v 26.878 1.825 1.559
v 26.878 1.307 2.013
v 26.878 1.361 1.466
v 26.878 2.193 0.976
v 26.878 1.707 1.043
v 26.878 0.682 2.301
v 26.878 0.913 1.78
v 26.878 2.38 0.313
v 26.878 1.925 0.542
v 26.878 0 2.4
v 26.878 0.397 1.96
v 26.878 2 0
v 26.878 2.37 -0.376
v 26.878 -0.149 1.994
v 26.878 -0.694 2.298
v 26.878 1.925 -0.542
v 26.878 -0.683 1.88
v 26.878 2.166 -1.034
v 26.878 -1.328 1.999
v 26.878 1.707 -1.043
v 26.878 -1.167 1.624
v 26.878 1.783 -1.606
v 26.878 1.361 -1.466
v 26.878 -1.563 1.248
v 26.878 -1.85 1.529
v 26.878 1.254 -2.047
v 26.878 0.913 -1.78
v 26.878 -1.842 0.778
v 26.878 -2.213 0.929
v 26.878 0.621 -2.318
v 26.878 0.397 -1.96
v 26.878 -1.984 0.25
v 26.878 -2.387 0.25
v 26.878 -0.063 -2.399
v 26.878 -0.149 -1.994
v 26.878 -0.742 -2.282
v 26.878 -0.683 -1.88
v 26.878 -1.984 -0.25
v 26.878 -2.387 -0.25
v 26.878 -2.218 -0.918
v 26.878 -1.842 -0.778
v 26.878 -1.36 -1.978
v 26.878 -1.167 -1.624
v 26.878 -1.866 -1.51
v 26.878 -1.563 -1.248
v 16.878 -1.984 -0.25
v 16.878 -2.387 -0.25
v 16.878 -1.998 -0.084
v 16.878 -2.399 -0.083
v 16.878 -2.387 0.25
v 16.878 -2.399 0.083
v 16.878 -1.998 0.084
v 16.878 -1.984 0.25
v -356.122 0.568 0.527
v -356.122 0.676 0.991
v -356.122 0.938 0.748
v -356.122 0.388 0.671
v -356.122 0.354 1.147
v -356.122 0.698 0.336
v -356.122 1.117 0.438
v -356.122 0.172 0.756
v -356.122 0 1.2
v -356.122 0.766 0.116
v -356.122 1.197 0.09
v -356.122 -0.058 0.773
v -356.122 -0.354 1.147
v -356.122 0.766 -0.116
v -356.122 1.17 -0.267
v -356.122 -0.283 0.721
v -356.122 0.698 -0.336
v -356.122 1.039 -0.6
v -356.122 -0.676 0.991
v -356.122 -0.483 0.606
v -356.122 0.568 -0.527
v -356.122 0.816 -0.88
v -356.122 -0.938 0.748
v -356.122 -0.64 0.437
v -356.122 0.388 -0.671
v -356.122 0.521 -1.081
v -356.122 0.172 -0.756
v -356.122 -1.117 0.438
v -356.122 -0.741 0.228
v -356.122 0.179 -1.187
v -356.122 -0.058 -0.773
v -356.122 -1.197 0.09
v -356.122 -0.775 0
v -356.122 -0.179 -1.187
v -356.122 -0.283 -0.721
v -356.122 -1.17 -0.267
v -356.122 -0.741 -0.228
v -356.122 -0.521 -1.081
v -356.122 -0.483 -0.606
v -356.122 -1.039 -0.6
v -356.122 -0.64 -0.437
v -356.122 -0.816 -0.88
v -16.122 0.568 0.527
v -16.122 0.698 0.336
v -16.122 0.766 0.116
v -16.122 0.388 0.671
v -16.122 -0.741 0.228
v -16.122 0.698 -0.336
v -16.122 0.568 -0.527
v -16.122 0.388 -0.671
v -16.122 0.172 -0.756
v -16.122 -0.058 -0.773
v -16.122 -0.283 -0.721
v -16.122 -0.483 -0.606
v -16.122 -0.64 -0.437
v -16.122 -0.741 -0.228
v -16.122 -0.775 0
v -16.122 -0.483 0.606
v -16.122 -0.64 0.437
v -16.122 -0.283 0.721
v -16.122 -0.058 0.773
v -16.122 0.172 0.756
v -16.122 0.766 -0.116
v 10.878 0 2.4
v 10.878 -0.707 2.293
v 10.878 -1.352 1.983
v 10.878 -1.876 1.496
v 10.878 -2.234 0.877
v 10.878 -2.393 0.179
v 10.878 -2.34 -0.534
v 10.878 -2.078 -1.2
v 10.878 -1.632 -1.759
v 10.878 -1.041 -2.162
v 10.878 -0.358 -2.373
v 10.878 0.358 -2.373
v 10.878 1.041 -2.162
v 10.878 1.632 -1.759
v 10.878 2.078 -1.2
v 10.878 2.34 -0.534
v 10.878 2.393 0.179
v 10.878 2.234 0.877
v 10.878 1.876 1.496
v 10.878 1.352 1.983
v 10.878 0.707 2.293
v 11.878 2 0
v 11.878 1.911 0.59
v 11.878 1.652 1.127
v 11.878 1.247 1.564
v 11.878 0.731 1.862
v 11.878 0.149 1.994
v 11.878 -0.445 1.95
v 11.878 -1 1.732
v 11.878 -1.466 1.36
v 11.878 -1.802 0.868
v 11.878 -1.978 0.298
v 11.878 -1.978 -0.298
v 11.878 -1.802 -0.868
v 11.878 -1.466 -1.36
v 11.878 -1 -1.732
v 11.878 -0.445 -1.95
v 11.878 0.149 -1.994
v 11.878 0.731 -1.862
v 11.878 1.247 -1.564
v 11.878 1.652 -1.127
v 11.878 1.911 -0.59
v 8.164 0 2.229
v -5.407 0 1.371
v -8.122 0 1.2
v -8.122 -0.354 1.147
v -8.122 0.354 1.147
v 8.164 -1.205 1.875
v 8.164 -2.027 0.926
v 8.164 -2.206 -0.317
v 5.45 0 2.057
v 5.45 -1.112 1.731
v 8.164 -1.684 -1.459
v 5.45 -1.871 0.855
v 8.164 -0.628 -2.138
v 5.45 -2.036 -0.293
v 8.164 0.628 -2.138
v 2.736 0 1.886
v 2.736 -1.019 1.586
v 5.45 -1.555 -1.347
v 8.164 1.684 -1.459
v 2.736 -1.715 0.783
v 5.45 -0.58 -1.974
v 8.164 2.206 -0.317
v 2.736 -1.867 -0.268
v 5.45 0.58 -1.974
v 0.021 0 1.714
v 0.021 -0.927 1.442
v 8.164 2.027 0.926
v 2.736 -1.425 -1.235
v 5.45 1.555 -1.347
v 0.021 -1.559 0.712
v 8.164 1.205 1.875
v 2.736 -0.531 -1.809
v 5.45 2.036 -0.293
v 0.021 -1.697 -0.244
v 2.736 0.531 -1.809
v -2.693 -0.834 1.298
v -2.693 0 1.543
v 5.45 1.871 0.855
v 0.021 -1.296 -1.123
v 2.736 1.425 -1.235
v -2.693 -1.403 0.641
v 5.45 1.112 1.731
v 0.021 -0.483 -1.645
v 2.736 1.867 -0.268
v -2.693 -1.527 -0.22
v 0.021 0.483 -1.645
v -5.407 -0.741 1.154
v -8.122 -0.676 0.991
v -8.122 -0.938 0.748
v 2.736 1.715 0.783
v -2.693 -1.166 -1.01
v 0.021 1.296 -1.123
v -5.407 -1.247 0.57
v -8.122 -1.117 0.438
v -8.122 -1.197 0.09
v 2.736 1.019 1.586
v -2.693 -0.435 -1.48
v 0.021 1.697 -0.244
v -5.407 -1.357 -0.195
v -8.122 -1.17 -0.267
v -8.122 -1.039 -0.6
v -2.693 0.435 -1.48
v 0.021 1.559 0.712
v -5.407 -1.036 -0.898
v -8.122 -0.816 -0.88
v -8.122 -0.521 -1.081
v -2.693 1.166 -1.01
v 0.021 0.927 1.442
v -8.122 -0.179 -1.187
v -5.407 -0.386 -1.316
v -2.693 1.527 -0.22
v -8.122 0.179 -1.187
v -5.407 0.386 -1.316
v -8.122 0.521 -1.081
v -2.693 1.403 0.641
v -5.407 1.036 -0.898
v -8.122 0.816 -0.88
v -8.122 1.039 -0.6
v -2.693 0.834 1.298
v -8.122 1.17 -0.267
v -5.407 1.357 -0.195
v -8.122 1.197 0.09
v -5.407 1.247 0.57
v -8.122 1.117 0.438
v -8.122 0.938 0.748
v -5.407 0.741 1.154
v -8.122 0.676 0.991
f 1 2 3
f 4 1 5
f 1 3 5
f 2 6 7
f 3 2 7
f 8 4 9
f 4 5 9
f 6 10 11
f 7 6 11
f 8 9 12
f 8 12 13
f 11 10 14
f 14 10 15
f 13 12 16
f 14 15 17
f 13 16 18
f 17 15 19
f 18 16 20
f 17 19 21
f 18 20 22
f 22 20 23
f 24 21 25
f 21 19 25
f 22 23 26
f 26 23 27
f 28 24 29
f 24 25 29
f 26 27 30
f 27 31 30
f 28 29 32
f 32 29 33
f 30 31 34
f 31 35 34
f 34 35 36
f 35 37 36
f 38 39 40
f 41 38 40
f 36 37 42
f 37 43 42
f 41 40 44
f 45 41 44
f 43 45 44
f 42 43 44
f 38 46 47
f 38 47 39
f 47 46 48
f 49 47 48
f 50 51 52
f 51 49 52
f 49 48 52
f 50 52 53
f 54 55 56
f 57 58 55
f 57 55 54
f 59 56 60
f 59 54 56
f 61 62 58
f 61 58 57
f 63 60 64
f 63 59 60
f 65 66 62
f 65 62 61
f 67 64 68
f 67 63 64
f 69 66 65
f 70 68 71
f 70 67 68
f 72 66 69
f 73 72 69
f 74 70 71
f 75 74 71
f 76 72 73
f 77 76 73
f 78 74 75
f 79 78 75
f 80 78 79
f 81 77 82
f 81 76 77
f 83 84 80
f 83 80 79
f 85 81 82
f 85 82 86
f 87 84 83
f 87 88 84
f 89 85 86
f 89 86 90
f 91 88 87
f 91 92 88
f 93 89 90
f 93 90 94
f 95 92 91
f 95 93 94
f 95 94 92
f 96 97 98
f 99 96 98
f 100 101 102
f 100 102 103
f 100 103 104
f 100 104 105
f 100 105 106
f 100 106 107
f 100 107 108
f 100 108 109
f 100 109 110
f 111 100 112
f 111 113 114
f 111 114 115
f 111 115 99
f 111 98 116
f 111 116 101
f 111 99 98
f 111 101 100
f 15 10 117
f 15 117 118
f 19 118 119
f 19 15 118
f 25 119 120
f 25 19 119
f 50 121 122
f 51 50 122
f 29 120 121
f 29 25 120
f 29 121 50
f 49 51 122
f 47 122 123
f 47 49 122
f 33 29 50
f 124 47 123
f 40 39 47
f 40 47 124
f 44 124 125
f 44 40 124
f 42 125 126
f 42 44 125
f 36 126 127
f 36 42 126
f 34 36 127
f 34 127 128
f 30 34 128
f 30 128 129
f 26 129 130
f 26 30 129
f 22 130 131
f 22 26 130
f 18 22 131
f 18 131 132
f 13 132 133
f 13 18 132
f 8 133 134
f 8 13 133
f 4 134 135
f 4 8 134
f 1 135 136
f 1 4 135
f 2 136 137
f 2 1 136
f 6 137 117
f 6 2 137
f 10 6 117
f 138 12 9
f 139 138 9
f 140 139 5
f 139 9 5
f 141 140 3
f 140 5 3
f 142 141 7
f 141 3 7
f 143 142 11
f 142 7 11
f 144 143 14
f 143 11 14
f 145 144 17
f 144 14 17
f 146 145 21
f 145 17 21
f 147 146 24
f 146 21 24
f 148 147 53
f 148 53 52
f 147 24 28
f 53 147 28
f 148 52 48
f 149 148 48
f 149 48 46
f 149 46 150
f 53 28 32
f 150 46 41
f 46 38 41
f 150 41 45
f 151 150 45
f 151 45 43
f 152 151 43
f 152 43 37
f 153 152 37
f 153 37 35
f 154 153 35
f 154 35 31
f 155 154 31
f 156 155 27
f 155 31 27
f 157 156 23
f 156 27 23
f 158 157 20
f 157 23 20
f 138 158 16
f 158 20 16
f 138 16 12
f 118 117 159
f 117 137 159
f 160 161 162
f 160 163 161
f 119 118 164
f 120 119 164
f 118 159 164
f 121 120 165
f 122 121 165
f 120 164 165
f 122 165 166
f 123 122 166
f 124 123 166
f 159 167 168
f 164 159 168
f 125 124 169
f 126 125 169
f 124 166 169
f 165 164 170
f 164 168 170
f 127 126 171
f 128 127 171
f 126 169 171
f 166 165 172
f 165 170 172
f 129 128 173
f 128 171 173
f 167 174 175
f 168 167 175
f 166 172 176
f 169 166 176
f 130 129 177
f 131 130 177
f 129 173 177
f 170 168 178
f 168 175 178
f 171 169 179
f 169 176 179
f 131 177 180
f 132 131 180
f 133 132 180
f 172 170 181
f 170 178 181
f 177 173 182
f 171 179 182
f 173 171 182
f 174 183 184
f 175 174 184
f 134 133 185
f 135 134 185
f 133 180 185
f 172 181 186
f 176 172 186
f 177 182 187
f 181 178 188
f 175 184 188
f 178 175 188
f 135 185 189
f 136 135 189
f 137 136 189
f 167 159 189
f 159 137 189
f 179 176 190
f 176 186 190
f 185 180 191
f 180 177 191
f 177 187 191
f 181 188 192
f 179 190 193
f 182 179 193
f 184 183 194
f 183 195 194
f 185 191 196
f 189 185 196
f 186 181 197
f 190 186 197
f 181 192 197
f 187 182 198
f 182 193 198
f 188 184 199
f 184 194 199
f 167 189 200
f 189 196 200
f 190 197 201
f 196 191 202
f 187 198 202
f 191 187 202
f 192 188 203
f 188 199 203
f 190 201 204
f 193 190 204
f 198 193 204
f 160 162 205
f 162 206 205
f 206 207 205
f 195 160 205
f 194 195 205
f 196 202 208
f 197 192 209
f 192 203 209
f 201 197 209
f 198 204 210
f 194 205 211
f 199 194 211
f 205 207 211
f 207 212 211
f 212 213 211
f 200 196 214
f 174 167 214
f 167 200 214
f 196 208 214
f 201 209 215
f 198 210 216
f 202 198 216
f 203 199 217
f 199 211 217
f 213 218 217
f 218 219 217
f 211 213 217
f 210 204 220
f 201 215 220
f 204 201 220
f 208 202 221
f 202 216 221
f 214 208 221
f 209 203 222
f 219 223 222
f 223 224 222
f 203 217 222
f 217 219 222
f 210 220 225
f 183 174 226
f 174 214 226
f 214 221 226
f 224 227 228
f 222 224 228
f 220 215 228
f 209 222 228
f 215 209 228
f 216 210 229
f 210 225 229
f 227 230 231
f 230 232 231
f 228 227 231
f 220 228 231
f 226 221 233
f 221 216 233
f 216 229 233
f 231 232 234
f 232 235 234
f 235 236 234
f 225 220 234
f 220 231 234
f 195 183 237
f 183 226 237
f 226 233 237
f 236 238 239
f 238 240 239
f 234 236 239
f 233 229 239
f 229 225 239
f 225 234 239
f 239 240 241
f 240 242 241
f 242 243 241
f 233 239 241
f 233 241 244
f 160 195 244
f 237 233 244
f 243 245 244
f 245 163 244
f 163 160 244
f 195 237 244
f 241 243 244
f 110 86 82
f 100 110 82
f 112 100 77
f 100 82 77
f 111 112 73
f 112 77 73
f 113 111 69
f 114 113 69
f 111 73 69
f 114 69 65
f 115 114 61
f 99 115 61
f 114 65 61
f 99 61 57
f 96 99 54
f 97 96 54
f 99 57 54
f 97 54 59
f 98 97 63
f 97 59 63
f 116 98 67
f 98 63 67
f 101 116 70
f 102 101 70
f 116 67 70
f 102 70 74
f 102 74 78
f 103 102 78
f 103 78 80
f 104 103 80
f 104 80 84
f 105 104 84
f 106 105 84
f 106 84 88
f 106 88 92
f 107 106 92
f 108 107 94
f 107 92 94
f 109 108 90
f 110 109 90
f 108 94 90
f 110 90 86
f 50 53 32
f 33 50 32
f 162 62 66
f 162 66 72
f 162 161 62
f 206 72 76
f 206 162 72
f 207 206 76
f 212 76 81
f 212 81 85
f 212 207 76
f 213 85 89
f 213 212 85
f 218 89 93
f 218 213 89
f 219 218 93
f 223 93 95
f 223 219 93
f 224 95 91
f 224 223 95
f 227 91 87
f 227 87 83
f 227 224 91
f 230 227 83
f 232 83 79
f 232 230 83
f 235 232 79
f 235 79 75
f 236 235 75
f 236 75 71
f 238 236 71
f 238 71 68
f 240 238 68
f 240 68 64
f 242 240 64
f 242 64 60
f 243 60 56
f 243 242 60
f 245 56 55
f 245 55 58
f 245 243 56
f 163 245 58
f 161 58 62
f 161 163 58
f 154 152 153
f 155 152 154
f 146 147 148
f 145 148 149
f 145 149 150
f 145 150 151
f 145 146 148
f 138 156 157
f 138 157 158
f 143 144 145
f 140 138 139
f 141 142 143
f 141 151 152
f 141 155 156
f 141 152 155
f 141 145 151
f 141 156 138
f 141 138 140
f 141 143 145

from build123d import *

# Parameters (mm, degrees)
F0_W     = 16
F0_H     = 2.4
F0_W_2   = 348
F0_H_2   = 1.2
F2_R     = 2
F3_DEPTH = 15
F4_W     = 10
F4_H     = 0.5
F5_DEPTH = 10
F6_R     = 0.775
F7_DEPTH = 340


with BuildPart() as f1:
    # F0 (on Front) → F1 (revolve)
    with BuildSketch(Plane.XZ):
        with Locations((18.878411, 1.2)):
            Rectangle(F0_W, F0_H)
        Polygon((-8.121589, 0), (10.878411, 0), (10.878411, 2.4), (-8.121589, 1.2), align=None)
        with Locations((-182.121589, 0.6)):
            Rectangle(F0_W_2, F0_H_2)
    revolve(axis=Axis((11.143533, 0, 0), (1, 0, 0)))

    # F2 (on face) → F3 (cut)
    with BuildSketch(Plane.YZ.offset(26.878411)):
        Circle(F2_R)
    extrude(amount=-F3_DEPTH, mode=Mode.SUBTRACT)

    # F4 (on Front) → F5 (cut)
    with BuildSketch(Plane.XZ):
        with Locations((21.878411, 0)):
            Rectangle(F4_W, F4_H)
    extrude(amount=F5_DEPTH, mode=Mode.SUBTRACT)

    # F6 (on face) → F7 (cut)
    with BuildSketch(Plane(origin=(-356.121589, 0, 0), x_dir=(0, -1, 0), z_dir=(-1, 0, 0))):
        Circle(F6_R)
    extrude(amount=-F7_DEPTH, mode=Mode.SUBTRACT)


solid = f1.part
